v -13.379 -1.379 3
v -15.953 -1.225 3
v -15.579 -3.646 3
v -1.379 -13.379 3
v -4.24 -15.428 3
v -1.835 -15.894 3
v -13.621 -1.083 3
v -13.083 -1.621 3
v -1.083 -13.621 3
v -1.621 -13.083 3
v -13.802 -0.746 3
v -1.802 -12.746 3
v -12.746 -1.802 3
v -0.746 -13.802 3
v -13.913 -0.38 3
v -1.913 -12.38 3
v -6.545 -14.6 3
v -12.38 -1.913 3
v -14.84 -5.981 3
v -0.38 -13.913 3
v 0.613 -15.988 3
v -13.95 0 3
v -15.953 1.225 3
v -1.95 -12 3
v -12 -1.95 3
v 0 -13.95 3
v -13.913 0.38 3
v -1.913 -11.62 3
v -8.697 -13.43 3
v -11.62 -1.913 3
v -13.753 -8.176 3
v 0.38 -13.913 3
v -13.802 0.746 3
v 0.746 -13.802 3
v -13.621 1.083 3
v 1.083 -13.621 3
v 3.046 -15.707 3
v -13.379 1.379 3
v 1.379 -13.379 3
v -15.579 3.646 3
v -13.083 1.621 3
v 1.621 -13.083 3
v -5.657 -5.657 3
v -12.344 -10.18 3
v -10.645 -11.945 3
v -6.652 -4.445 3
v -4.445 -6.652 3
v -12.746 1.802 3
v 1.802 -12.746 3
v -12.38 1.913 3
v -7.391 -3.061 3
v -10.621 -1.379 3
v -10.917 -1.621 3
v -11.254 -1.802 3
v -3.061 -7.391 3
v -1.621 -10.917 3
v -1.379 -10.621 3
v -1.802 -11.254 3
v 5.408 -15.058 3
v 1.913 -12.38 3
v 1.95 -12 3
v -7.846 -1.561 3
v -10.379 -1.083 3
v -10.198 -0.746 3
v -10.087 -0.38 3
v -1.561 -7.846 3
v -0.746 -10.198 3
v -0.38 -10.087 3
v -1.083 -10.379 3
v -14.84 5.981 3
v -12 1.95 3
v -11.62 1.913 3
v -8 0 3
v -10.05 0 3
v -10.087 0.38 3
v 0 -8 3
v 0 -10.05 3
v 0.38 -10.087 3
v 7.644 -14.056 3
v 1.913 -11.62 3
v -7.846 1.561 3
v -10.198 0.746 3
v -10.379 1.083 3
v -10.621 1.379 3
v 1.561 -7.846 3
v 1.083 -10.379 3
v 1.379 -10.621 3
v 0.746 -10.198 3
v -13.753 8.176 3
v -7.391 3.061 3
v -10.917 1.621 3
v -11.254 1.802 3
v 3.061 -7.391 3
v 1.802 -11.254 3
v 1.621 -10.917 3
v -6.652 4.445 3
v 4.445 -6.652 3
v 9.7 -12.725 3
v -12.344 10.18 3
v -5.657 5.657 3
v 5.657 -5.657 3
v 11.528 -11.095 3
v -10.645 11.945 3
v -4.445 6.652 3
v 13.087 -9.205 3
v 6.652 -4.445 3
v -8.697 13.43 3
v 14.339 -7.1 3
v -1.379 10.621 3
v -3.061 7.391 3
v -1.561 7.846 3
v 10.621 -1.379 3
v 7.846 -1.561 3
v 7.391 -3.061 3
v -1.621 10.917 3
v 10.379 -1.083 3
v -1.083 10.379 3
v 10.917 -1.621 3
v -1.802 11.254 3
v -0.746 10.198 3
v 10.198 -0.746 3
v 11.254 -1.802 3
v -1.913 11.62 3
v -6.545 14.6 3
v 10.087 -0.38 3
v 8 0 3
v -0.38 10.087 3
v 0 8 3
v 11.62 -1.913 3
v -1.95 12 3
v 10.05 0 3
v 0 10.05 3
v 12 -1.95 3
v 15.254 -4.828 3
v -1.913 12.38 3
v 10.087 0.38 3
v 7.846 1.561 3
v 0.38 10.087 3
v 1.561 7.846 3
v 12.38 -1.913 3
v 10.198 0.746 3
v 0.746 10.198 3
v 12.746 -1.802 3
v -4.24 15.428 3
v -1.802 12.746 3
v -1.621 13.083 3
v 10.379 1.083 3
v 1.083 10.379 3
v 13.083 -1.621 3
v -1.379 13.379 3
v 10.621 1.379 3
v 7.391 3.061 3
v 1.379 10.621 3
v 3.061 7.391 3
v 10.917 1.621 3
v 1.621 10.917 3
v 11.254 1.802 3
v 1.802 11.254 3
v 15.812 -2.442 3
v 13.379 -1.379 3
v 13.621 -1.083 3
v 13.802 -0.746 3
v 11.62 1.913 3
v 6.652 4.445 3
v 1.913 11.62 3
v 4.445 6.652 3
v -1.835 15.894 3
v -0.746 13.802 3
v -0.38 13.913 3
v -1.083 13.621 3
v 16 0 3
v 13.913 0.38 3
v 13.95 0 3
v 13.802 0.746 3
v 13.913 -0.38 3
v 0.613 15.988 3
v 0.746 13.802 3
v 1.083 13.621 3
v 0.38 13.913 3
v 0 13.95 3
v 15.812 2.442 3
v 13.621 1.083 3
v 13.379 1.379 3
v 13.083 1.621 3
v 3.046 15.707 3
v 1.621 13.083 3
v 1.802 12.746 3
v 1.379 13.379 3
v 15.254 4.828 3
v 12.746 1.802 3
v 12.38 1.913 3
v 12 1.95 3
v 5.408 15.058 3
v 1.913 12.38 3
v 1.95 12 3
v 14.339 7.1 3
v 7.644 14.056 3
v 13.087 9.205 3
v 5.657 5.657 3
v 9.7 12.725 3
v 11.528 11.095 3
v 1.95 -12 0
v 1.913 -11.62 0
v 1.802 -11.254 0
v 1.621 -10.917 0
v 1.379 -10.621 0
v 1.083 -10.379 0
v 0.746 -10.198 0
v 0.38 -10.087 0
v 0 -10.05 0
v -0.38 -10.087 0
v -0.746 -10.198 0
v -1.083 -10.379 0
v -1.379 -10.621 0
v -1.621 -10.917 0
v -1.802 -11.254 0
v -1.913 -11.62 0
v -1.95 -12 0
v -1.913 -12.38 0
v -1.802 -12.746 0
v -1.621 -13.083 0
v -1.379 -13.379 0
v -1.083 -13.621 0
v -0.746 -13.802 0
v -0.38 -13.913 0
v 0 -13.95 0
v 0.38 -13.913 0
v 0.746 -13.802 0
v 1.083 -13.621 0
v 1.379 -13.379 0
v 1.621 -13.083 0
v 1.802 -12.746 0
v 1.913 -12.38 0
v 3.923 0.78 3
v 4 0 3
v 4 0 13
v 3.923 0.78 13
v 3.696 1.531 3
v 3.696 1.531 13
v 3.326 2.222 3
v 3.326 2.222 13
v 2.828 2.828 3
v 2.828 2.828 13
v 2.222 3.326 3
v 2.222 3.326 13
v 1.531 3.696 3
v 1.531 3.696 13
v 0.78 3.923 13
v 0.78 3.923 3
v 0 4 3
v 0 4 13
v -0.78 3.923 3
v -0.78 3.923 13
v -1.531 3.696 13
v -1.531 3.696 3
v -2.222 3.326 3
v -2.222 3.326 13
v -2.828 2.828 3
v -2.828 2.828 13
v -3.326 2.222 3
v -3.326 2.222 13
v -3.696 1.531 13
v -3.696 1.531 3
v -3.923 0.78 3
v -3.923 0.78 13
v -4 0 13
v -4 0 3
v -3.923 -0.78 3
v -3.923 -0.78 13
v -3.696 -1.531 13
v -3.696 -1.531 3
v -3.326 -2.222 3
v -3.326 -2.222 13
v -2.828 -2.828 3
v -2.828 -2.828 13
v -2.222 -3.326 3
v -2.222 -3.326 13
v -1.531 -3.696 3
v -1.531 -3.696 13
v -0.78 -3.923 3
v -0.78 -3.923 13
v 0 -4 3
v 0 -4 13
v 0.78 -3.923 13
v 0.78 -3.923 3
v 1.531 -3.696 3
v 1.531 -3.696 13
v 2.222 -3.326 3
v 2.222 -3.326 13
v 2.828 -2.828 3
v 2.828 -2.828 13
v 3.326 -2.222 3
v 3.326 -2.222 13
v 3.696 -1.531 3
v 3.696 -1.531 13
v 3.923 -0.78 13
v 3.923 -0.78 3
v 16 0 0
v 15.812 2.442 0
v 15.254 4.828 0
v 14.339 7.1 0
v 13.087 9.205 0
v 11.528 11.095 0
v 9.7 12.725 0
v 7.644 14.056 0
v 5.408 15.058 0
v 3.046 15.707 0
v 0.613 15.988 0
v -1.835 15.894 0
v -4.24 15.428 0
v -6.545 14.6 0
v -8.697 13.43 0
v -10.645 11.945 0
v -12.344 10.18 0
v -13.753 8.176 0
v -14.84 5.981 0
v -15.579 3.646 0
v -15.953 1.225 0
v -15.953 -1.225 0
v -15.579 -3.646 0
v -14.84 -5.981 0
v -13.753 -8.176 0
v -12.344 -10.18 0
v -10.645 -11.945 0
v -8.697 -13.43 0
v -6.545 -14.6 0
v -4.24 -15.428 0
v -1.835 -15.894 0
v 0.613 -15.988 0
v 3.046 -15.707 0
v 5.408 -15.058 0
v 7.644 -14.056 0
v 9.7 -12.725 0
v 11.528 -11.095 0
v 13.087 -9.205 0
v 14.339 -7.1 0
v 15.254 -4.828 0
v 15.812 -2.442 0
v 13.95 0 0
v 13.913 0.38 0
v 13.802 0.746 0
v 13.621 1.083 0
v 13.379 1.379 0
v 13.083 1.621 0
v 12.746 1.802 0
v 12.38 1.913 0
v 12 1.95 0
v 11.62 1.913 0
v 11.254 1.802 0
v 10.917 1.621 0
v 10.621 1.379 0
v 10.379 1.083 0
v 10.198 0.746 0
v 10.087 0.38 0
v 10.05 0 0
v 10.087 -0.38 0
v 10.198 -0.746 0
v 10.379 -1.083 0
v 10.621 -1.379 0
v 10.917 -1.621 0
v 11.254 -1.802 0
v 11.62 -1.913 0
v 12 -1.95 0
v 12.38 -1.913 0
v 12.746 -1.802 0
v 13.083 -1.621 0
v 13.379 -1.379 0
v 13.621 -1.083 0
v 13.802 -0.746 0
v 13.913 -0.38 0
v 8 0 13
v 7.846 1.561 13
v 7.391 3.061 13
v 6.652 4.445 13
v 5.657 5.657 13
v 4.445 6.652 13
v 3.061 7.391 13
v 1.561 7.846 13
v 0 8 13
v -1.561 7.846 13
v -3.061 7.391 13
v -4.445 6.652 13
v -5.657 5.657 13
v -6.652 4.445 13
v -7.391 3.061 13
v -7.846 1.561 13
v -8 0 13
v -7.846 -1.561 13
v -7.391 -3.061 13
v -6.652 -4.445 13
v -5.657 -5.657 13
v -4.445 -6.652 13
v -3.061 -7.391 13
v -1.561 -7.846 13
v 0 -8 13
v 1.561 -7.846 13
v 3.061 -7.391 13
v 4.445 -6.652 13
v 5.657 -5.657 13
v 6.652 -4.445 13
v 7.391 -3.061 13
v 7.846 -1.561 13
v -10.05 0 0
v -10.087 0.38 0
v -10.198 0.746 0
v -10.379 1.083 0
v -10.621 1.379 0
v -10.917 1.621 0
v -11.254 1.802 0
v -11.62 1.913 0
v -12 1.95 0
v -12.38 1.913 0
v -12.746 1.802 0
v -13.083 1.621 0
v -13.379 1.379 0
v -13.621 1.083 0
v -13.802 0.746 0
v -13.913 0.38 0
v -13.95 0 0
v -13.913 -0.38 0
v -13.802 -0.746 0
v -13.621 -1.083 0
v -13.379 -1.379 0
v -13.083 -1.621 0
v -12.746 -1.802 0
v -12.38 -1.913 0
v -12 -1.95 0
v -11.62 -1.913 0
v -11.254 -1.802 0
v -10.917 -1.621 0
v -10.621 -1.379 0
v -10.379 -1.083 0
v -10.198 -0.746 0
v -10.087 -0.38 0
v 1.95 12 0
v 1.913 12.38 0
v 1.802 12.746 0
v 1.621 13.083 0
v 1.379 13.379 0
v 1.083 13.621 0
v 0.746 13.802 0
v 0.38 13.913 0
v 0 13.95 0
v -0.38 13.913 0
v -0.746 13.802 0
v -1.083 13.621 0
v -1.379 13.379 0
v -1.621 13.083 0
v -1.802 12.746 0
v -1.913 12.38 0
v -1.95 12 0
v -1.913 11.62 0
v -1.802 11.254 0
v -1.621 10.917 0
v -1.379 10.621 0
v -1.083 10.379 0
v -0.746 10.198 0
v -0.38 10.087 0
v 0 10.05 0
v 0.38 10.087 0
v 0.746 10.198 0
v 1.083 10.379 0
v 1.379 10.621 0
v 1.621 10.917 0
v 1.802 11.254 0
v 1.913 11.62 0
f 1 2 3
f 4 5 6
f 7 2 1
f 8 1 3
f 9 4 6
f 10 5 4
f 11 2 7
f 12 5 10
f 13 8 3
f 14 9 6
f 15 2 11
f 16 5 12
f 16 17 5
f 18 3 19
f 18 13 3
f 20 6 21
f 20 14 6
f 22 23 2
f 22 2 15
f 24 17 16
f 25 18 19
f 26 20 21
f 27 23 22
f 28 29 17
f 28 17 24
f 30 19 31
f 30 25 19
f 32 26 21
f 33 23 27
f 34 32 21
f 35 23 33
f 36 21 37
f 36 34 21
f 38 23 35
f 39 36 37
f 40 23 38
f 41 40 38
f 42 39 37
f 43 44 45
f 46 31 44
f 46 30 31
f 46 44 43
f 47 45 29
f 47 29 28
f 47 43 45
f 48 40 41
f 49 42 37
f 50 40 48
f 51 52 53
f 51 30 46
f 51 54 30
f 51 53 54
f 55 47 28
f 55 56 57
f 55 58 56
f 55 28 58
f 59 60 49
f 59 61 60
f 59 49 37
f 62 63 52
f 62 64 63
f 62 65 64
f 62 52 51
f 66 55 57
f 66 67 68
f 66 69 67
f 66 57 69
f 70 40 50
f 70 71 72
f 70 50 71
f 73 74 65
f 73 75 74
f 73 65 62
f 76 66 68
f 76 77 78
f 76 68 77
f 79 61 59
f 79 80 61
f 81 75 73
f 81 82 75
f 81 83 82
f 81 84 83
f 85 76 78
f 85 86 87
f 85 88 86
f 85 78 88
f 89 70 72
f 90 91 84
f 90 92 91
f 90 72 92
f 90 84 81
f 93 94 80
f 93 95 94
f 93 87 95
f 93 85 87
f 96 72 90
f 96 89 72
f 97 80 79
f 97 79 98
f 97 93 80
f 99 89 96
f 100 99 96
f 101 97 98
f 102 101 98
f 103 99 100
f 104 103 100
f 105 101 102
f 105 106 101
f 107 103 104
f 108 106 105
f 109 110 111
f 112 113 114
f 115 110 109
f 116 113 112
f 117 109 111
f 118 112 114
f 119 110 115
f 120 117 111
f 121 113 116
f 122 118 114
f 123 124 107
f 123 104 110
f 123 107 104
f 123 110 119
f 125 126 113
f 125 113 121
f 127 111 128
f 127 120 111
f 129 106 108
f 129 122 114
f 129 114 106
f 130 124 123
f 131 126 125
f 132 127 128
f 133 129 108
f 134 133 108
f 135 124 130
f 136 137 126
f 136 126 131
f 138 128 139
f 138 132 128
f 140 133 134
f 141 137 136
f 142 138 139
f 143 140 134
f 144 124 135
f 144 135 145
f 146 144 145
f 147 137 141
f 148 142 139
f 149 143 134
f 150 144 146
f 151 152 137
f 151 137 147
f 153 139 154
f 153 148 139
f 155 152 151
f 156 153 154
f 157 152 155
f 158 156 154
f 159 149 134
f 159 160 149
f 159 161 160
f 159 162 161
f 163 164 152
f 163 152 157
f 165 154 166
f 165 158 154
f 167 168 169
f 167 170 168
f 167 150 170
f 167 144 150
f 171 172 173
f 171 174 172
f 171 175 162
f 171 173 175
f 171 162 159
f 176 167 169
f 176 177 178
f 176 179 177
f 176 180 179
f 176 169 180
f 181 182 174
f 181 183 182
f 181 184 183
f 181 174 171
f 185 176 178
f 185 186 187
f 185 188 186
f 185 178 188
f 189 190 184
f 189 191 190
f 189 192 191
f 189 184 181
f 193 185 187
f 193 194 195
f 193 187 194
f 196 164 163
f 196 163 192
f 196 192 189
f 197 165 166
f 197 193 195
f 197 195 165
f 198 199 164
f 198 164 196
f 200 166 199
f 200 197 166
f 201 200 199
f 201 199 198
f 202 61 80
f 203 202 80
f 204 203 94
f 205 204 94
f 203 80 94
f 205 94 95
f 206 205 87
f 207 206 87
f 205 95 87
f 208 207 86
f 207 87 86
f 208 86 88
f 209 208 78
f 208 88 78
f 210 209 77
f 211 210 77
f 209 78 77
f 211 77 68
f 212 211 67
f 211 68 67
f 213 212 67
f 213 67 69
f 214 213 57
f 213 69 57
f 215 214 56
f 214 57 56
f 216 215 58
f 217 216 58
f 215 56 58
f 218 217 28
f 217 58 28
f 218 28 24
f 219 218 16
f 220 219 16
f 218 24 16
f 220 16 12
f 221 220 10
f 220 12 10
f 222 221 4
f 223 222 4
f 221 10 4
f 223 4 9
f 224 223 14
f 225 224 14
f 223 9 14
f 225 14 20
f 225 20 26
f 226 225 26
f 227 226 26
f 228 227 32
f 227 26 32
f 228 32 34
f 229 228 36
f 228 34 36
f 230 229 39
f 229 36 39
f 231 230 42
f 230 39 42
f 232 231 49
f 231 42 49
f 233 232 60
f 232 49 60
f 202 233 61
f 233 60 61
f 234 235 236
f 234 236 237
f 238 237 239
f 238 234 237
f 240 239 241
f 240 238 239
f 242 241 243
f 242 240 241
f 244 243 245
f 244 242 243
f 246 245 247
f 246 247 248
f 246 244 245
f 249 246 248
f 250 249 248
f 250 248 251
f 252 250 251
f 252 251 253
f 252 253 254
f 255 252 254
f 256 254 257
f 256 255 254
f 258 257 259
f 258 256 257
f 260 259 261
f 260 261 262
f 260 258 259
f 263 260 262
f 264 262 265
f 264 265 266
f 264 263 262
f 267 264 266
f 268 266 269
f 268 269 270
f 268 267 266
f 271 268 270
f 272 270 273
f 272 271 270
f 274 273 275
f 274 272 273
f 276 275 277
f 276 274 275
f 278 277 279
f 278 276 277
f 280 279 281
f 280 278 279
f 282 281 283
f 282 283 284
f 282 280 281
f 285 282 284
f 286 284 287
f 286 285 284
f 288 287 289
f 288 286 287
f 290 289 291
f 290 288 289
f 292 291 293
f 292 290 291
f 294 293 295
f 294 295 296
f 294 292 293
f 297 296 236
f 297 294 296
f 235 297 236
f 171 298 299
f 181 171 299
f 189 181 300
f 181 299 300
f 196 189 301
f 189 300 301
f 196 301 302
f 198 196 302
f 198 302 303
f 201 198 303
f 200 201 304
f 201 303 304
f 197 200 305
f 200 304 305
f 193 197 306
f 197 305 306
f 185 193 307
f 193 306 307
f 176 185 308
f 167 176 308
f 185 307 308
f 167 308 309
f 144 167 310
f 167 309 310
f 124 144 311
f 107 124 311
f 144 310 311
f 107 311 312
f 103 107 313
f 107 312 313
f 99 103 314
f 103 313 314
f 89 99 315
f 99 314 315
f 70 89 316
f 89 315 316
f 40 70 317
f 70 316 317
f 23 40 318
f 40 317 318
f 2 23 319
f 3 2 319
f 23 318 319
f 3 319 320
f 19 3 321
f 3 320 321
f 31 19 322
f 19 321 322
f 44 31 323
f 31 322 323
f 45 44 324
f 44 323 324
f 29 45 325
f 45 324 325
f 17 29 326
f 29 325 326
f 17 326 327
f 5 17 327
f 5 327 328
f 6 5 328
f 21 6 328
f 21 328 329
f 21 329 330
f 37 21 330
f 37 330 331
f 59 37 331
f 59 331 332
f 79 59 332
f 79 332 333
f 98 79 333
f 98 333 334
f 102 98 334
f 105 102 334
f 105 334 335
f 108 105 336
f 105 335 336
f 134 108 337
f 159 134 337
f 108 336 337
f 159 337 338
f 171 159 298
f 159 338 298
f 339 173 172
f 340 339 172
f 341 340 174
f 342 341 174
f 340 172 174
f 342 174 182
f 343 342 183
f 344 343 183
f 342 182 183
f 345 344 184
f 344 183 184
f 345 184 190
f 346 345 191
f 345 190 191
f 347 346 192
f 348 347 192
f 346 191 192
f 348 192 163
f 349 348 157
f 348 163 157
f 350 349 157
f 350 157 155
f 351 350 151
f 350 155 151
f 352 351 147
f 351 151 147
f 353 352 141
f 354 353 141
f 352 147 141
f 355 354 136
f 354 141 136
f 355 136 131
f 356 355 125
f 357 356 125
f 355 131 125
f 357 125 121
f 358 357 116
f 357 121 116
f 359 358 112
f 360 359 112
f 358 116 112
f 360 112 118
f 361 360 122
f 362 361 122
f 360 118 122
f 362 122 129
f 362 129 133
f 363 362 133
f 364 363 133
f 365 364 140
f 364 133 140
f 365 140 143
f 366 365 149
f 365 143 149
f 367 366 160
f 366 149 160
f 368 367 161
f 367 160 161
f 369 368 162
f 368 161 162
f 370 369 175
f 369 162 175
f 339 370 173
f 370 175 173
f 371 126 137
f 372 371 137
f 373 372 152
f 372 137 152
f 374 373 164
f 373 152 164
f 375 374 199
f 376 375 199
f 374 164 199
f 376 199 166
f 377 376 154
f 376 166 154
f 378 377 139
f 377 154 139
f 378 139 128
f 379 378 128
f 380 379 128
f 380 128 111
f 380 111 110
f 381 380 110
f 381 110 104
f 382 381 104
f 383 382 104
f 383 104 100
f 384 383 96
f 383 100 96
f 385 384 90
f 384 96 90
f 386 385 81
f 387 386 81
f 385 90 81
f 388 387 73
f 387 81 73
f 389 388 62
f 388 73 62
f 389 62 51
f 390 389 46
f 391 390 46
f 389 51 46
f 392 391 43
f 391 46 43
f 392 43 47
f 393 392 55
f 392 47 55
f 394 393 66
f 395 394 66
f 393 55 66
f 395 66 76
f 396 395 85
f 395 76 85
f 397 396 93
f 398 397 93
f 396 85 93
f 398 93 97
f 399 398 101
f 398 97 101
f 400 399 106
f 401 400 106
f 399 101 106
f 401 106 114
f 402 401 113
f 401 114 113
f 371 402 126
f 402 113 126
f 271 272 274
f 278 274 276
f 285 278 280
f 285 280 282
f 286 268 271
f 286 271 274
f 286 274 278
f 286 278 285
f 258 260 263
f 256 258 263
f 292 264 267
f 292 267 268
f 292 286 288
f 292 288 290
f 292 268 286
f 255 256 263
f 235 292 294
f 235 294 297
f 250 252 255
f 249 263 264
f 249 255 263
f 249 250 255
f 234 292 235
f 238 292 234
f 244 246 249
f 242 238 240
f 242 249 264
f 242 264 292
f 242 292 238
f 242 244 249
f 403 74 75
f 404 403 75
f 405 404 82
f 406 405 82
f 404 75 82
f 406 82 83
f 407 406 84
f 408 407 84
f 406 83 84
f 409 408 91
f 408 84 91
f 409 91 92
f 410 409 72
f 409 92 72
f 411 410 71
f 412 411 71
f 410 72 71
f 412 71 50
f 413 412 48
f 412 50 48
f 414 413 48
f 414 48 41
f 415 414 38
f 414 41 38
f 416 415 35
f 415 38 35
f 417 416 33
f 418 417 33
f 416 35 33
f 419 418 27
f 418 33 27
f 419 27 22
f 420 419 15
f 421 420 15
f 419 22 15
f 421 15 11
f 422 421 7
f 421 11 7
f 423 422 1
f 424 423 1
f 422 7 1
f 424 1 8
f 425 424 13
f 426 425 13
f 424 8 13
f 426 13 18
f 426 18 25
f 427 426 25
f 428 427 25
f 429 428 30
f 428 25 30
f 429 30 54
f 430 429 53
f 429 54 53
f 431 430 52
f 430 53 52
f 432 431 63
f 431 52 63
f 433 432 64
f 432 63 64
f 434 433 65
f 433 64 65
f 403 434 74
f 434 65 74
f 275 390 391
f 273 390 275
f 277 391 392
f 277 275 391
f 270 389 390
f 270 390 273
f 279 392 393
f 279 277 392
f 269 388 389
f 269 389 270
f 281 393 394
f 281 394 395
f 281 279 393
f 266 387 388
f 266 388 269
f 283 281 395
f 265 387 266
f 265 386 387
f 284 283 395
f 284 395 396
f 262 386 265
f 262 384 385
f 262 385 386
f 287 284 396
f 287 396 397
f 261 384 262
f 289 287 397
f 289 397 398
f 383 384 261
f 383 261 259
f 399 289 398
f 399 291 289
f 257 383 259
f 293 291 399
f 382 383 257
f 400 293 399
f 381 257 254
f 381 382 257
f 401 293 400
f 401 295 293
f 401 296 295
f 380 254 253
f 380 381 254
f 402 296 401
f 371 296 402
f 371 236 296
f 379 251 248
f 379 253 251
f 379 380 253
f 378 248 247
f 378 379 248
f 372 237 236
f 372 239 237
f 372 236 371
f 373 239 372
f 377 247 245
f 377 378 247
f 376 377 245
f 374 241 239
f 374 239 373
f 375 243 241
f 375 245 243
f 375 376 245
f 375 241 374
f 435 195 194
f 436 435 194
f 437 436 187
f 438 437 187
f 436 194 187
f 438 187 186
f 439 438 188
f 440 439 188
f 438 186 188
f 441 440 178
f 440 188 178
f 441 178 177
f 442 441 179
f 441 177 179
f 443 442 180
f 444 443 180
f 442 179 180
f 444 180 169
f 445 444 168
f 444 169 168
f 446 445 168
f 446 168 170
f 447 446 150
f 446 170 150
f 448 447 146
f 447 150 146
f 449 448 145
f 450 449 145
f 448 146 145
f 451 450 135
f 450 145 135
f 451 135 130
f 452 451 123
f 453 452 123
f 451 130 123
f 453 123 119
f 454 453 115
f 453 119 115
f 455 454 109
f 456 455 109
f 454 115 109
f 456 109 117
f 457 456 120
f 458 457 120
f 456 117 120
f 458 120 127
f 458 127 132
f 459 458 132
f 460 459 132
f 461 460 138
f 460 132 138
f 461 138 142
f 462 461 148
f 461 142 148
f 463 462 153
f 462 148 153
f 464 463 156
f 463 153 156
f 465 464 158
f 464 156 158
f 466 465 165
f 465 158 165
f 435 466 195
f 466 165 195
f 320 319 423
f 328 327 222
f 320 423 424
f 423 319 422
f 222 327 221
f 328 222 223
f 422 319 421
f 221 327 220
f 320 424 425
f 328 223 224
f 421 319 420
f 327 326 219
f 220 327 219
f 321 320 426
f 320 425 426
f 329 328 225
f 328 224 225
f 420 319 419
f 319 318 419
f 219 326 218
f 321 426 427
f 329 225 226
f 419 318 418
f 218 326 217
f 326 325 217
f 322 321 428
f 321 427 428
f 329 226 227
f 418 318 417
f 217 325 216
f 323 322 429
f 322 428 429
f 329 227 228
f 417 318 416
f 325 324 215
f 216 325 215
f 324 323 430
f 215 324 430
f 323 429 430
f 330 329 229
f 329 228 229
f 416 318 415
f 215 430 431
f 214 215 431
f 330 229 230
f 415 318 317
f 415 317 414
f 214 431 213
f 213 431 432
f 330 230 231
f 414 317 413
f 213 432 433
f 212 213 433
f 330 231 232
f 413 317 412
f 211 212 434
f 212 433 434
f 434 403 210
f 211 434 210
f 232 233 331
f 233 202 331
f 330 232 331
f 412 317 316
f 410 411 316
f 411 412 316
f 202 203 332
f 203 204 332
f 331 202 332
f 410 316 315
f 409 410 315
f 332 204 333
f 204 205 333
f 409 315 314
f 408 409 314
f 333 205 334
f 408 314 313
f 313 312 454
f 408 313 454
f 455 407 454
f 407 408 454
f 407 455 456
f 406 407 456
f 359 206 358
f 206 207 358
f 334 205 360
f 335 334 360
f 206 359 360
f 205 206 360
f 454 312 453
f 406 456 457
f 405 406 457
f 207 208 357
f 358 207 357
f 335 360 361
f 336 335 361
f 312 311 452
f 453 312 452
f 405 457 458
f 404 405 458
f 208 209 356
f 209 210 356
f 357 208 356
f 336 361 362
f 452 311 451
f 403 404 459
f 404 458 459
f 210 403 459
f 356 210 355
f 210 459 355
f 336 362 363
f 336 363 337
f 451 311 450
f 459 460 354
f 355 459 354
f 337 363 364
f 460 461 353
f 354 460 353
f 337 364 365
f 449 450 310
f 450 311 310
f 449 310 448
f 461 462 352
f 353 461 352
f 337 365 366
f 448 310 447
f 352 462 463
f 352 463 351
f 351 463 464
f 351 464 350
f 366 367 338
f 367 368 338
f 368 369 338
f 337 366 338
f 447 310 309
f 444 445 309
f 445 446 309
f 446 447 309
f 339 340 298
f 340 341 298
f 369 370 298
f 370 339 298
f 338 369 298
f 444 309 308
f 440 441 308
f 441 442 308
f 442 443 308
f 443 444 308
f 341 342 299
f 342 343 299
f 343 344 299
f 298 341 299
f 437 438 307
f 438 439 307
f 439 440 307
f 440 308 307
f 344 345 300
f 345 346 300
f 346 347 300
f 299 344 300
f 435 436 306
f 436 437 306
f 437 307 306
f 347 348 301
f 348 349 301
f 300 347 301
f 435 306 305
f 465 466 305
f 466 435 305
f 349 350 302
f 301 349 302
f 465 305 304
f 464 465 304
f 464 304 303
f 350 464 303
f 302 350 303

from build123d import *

# Parameters (mm, degrees)
CROQUIS1_R              = 16
SALIENTE_EXTRUIR1_DEPTH = 3
CROQUIS2_R              = 8
CROQUIS2_R_2            = 4
SALIENTE_EXTRUIR2_DEPTH = 10
CROQUIS3_R              = 1.95
CORTAR_EXTRUIR1_DEPTH   = 3


with BuildPart() as part:
    # Croquis1 → Saliente-Extruir1 (new body)
    with BuildSketch(Plane.XY):
        Circle(CROQUIS1_R)
    extrude(amount=SALIENTE_EXTRUIR1_DEPTH)

    # Croquis2 → Saliente-Extruir2 (add)
    with BuildSketch(Plane.XY.offset(3)):
        Circle(CROQUIS2_R)
        Circle(CROQUIS2_R_2, mode=Mode.SUBTRACT)
    extrude(amount=SALIENTE_EXTRUIR2_DEPTH)

    # Croquis3 → Cortar-Extruir1 (cut)
    with BuildSketch(Plane.XY.offset(3)):
        with Locations((0, 12)):
            Circle(CROQUIS3_R)
        with Locations((12, 0)):
            Circle(CROQUIS3_R)
        with Locations((0, -12)):
            Circle(CROQUIS3_R)
        with Locations((-12, 0)):
            Circle(CROQUIS3_R)
    extrude(amount=-CORTAR_EXTRUIR1_DEPTH, mode=Mode.SUBTRACT)


solid = part.part
